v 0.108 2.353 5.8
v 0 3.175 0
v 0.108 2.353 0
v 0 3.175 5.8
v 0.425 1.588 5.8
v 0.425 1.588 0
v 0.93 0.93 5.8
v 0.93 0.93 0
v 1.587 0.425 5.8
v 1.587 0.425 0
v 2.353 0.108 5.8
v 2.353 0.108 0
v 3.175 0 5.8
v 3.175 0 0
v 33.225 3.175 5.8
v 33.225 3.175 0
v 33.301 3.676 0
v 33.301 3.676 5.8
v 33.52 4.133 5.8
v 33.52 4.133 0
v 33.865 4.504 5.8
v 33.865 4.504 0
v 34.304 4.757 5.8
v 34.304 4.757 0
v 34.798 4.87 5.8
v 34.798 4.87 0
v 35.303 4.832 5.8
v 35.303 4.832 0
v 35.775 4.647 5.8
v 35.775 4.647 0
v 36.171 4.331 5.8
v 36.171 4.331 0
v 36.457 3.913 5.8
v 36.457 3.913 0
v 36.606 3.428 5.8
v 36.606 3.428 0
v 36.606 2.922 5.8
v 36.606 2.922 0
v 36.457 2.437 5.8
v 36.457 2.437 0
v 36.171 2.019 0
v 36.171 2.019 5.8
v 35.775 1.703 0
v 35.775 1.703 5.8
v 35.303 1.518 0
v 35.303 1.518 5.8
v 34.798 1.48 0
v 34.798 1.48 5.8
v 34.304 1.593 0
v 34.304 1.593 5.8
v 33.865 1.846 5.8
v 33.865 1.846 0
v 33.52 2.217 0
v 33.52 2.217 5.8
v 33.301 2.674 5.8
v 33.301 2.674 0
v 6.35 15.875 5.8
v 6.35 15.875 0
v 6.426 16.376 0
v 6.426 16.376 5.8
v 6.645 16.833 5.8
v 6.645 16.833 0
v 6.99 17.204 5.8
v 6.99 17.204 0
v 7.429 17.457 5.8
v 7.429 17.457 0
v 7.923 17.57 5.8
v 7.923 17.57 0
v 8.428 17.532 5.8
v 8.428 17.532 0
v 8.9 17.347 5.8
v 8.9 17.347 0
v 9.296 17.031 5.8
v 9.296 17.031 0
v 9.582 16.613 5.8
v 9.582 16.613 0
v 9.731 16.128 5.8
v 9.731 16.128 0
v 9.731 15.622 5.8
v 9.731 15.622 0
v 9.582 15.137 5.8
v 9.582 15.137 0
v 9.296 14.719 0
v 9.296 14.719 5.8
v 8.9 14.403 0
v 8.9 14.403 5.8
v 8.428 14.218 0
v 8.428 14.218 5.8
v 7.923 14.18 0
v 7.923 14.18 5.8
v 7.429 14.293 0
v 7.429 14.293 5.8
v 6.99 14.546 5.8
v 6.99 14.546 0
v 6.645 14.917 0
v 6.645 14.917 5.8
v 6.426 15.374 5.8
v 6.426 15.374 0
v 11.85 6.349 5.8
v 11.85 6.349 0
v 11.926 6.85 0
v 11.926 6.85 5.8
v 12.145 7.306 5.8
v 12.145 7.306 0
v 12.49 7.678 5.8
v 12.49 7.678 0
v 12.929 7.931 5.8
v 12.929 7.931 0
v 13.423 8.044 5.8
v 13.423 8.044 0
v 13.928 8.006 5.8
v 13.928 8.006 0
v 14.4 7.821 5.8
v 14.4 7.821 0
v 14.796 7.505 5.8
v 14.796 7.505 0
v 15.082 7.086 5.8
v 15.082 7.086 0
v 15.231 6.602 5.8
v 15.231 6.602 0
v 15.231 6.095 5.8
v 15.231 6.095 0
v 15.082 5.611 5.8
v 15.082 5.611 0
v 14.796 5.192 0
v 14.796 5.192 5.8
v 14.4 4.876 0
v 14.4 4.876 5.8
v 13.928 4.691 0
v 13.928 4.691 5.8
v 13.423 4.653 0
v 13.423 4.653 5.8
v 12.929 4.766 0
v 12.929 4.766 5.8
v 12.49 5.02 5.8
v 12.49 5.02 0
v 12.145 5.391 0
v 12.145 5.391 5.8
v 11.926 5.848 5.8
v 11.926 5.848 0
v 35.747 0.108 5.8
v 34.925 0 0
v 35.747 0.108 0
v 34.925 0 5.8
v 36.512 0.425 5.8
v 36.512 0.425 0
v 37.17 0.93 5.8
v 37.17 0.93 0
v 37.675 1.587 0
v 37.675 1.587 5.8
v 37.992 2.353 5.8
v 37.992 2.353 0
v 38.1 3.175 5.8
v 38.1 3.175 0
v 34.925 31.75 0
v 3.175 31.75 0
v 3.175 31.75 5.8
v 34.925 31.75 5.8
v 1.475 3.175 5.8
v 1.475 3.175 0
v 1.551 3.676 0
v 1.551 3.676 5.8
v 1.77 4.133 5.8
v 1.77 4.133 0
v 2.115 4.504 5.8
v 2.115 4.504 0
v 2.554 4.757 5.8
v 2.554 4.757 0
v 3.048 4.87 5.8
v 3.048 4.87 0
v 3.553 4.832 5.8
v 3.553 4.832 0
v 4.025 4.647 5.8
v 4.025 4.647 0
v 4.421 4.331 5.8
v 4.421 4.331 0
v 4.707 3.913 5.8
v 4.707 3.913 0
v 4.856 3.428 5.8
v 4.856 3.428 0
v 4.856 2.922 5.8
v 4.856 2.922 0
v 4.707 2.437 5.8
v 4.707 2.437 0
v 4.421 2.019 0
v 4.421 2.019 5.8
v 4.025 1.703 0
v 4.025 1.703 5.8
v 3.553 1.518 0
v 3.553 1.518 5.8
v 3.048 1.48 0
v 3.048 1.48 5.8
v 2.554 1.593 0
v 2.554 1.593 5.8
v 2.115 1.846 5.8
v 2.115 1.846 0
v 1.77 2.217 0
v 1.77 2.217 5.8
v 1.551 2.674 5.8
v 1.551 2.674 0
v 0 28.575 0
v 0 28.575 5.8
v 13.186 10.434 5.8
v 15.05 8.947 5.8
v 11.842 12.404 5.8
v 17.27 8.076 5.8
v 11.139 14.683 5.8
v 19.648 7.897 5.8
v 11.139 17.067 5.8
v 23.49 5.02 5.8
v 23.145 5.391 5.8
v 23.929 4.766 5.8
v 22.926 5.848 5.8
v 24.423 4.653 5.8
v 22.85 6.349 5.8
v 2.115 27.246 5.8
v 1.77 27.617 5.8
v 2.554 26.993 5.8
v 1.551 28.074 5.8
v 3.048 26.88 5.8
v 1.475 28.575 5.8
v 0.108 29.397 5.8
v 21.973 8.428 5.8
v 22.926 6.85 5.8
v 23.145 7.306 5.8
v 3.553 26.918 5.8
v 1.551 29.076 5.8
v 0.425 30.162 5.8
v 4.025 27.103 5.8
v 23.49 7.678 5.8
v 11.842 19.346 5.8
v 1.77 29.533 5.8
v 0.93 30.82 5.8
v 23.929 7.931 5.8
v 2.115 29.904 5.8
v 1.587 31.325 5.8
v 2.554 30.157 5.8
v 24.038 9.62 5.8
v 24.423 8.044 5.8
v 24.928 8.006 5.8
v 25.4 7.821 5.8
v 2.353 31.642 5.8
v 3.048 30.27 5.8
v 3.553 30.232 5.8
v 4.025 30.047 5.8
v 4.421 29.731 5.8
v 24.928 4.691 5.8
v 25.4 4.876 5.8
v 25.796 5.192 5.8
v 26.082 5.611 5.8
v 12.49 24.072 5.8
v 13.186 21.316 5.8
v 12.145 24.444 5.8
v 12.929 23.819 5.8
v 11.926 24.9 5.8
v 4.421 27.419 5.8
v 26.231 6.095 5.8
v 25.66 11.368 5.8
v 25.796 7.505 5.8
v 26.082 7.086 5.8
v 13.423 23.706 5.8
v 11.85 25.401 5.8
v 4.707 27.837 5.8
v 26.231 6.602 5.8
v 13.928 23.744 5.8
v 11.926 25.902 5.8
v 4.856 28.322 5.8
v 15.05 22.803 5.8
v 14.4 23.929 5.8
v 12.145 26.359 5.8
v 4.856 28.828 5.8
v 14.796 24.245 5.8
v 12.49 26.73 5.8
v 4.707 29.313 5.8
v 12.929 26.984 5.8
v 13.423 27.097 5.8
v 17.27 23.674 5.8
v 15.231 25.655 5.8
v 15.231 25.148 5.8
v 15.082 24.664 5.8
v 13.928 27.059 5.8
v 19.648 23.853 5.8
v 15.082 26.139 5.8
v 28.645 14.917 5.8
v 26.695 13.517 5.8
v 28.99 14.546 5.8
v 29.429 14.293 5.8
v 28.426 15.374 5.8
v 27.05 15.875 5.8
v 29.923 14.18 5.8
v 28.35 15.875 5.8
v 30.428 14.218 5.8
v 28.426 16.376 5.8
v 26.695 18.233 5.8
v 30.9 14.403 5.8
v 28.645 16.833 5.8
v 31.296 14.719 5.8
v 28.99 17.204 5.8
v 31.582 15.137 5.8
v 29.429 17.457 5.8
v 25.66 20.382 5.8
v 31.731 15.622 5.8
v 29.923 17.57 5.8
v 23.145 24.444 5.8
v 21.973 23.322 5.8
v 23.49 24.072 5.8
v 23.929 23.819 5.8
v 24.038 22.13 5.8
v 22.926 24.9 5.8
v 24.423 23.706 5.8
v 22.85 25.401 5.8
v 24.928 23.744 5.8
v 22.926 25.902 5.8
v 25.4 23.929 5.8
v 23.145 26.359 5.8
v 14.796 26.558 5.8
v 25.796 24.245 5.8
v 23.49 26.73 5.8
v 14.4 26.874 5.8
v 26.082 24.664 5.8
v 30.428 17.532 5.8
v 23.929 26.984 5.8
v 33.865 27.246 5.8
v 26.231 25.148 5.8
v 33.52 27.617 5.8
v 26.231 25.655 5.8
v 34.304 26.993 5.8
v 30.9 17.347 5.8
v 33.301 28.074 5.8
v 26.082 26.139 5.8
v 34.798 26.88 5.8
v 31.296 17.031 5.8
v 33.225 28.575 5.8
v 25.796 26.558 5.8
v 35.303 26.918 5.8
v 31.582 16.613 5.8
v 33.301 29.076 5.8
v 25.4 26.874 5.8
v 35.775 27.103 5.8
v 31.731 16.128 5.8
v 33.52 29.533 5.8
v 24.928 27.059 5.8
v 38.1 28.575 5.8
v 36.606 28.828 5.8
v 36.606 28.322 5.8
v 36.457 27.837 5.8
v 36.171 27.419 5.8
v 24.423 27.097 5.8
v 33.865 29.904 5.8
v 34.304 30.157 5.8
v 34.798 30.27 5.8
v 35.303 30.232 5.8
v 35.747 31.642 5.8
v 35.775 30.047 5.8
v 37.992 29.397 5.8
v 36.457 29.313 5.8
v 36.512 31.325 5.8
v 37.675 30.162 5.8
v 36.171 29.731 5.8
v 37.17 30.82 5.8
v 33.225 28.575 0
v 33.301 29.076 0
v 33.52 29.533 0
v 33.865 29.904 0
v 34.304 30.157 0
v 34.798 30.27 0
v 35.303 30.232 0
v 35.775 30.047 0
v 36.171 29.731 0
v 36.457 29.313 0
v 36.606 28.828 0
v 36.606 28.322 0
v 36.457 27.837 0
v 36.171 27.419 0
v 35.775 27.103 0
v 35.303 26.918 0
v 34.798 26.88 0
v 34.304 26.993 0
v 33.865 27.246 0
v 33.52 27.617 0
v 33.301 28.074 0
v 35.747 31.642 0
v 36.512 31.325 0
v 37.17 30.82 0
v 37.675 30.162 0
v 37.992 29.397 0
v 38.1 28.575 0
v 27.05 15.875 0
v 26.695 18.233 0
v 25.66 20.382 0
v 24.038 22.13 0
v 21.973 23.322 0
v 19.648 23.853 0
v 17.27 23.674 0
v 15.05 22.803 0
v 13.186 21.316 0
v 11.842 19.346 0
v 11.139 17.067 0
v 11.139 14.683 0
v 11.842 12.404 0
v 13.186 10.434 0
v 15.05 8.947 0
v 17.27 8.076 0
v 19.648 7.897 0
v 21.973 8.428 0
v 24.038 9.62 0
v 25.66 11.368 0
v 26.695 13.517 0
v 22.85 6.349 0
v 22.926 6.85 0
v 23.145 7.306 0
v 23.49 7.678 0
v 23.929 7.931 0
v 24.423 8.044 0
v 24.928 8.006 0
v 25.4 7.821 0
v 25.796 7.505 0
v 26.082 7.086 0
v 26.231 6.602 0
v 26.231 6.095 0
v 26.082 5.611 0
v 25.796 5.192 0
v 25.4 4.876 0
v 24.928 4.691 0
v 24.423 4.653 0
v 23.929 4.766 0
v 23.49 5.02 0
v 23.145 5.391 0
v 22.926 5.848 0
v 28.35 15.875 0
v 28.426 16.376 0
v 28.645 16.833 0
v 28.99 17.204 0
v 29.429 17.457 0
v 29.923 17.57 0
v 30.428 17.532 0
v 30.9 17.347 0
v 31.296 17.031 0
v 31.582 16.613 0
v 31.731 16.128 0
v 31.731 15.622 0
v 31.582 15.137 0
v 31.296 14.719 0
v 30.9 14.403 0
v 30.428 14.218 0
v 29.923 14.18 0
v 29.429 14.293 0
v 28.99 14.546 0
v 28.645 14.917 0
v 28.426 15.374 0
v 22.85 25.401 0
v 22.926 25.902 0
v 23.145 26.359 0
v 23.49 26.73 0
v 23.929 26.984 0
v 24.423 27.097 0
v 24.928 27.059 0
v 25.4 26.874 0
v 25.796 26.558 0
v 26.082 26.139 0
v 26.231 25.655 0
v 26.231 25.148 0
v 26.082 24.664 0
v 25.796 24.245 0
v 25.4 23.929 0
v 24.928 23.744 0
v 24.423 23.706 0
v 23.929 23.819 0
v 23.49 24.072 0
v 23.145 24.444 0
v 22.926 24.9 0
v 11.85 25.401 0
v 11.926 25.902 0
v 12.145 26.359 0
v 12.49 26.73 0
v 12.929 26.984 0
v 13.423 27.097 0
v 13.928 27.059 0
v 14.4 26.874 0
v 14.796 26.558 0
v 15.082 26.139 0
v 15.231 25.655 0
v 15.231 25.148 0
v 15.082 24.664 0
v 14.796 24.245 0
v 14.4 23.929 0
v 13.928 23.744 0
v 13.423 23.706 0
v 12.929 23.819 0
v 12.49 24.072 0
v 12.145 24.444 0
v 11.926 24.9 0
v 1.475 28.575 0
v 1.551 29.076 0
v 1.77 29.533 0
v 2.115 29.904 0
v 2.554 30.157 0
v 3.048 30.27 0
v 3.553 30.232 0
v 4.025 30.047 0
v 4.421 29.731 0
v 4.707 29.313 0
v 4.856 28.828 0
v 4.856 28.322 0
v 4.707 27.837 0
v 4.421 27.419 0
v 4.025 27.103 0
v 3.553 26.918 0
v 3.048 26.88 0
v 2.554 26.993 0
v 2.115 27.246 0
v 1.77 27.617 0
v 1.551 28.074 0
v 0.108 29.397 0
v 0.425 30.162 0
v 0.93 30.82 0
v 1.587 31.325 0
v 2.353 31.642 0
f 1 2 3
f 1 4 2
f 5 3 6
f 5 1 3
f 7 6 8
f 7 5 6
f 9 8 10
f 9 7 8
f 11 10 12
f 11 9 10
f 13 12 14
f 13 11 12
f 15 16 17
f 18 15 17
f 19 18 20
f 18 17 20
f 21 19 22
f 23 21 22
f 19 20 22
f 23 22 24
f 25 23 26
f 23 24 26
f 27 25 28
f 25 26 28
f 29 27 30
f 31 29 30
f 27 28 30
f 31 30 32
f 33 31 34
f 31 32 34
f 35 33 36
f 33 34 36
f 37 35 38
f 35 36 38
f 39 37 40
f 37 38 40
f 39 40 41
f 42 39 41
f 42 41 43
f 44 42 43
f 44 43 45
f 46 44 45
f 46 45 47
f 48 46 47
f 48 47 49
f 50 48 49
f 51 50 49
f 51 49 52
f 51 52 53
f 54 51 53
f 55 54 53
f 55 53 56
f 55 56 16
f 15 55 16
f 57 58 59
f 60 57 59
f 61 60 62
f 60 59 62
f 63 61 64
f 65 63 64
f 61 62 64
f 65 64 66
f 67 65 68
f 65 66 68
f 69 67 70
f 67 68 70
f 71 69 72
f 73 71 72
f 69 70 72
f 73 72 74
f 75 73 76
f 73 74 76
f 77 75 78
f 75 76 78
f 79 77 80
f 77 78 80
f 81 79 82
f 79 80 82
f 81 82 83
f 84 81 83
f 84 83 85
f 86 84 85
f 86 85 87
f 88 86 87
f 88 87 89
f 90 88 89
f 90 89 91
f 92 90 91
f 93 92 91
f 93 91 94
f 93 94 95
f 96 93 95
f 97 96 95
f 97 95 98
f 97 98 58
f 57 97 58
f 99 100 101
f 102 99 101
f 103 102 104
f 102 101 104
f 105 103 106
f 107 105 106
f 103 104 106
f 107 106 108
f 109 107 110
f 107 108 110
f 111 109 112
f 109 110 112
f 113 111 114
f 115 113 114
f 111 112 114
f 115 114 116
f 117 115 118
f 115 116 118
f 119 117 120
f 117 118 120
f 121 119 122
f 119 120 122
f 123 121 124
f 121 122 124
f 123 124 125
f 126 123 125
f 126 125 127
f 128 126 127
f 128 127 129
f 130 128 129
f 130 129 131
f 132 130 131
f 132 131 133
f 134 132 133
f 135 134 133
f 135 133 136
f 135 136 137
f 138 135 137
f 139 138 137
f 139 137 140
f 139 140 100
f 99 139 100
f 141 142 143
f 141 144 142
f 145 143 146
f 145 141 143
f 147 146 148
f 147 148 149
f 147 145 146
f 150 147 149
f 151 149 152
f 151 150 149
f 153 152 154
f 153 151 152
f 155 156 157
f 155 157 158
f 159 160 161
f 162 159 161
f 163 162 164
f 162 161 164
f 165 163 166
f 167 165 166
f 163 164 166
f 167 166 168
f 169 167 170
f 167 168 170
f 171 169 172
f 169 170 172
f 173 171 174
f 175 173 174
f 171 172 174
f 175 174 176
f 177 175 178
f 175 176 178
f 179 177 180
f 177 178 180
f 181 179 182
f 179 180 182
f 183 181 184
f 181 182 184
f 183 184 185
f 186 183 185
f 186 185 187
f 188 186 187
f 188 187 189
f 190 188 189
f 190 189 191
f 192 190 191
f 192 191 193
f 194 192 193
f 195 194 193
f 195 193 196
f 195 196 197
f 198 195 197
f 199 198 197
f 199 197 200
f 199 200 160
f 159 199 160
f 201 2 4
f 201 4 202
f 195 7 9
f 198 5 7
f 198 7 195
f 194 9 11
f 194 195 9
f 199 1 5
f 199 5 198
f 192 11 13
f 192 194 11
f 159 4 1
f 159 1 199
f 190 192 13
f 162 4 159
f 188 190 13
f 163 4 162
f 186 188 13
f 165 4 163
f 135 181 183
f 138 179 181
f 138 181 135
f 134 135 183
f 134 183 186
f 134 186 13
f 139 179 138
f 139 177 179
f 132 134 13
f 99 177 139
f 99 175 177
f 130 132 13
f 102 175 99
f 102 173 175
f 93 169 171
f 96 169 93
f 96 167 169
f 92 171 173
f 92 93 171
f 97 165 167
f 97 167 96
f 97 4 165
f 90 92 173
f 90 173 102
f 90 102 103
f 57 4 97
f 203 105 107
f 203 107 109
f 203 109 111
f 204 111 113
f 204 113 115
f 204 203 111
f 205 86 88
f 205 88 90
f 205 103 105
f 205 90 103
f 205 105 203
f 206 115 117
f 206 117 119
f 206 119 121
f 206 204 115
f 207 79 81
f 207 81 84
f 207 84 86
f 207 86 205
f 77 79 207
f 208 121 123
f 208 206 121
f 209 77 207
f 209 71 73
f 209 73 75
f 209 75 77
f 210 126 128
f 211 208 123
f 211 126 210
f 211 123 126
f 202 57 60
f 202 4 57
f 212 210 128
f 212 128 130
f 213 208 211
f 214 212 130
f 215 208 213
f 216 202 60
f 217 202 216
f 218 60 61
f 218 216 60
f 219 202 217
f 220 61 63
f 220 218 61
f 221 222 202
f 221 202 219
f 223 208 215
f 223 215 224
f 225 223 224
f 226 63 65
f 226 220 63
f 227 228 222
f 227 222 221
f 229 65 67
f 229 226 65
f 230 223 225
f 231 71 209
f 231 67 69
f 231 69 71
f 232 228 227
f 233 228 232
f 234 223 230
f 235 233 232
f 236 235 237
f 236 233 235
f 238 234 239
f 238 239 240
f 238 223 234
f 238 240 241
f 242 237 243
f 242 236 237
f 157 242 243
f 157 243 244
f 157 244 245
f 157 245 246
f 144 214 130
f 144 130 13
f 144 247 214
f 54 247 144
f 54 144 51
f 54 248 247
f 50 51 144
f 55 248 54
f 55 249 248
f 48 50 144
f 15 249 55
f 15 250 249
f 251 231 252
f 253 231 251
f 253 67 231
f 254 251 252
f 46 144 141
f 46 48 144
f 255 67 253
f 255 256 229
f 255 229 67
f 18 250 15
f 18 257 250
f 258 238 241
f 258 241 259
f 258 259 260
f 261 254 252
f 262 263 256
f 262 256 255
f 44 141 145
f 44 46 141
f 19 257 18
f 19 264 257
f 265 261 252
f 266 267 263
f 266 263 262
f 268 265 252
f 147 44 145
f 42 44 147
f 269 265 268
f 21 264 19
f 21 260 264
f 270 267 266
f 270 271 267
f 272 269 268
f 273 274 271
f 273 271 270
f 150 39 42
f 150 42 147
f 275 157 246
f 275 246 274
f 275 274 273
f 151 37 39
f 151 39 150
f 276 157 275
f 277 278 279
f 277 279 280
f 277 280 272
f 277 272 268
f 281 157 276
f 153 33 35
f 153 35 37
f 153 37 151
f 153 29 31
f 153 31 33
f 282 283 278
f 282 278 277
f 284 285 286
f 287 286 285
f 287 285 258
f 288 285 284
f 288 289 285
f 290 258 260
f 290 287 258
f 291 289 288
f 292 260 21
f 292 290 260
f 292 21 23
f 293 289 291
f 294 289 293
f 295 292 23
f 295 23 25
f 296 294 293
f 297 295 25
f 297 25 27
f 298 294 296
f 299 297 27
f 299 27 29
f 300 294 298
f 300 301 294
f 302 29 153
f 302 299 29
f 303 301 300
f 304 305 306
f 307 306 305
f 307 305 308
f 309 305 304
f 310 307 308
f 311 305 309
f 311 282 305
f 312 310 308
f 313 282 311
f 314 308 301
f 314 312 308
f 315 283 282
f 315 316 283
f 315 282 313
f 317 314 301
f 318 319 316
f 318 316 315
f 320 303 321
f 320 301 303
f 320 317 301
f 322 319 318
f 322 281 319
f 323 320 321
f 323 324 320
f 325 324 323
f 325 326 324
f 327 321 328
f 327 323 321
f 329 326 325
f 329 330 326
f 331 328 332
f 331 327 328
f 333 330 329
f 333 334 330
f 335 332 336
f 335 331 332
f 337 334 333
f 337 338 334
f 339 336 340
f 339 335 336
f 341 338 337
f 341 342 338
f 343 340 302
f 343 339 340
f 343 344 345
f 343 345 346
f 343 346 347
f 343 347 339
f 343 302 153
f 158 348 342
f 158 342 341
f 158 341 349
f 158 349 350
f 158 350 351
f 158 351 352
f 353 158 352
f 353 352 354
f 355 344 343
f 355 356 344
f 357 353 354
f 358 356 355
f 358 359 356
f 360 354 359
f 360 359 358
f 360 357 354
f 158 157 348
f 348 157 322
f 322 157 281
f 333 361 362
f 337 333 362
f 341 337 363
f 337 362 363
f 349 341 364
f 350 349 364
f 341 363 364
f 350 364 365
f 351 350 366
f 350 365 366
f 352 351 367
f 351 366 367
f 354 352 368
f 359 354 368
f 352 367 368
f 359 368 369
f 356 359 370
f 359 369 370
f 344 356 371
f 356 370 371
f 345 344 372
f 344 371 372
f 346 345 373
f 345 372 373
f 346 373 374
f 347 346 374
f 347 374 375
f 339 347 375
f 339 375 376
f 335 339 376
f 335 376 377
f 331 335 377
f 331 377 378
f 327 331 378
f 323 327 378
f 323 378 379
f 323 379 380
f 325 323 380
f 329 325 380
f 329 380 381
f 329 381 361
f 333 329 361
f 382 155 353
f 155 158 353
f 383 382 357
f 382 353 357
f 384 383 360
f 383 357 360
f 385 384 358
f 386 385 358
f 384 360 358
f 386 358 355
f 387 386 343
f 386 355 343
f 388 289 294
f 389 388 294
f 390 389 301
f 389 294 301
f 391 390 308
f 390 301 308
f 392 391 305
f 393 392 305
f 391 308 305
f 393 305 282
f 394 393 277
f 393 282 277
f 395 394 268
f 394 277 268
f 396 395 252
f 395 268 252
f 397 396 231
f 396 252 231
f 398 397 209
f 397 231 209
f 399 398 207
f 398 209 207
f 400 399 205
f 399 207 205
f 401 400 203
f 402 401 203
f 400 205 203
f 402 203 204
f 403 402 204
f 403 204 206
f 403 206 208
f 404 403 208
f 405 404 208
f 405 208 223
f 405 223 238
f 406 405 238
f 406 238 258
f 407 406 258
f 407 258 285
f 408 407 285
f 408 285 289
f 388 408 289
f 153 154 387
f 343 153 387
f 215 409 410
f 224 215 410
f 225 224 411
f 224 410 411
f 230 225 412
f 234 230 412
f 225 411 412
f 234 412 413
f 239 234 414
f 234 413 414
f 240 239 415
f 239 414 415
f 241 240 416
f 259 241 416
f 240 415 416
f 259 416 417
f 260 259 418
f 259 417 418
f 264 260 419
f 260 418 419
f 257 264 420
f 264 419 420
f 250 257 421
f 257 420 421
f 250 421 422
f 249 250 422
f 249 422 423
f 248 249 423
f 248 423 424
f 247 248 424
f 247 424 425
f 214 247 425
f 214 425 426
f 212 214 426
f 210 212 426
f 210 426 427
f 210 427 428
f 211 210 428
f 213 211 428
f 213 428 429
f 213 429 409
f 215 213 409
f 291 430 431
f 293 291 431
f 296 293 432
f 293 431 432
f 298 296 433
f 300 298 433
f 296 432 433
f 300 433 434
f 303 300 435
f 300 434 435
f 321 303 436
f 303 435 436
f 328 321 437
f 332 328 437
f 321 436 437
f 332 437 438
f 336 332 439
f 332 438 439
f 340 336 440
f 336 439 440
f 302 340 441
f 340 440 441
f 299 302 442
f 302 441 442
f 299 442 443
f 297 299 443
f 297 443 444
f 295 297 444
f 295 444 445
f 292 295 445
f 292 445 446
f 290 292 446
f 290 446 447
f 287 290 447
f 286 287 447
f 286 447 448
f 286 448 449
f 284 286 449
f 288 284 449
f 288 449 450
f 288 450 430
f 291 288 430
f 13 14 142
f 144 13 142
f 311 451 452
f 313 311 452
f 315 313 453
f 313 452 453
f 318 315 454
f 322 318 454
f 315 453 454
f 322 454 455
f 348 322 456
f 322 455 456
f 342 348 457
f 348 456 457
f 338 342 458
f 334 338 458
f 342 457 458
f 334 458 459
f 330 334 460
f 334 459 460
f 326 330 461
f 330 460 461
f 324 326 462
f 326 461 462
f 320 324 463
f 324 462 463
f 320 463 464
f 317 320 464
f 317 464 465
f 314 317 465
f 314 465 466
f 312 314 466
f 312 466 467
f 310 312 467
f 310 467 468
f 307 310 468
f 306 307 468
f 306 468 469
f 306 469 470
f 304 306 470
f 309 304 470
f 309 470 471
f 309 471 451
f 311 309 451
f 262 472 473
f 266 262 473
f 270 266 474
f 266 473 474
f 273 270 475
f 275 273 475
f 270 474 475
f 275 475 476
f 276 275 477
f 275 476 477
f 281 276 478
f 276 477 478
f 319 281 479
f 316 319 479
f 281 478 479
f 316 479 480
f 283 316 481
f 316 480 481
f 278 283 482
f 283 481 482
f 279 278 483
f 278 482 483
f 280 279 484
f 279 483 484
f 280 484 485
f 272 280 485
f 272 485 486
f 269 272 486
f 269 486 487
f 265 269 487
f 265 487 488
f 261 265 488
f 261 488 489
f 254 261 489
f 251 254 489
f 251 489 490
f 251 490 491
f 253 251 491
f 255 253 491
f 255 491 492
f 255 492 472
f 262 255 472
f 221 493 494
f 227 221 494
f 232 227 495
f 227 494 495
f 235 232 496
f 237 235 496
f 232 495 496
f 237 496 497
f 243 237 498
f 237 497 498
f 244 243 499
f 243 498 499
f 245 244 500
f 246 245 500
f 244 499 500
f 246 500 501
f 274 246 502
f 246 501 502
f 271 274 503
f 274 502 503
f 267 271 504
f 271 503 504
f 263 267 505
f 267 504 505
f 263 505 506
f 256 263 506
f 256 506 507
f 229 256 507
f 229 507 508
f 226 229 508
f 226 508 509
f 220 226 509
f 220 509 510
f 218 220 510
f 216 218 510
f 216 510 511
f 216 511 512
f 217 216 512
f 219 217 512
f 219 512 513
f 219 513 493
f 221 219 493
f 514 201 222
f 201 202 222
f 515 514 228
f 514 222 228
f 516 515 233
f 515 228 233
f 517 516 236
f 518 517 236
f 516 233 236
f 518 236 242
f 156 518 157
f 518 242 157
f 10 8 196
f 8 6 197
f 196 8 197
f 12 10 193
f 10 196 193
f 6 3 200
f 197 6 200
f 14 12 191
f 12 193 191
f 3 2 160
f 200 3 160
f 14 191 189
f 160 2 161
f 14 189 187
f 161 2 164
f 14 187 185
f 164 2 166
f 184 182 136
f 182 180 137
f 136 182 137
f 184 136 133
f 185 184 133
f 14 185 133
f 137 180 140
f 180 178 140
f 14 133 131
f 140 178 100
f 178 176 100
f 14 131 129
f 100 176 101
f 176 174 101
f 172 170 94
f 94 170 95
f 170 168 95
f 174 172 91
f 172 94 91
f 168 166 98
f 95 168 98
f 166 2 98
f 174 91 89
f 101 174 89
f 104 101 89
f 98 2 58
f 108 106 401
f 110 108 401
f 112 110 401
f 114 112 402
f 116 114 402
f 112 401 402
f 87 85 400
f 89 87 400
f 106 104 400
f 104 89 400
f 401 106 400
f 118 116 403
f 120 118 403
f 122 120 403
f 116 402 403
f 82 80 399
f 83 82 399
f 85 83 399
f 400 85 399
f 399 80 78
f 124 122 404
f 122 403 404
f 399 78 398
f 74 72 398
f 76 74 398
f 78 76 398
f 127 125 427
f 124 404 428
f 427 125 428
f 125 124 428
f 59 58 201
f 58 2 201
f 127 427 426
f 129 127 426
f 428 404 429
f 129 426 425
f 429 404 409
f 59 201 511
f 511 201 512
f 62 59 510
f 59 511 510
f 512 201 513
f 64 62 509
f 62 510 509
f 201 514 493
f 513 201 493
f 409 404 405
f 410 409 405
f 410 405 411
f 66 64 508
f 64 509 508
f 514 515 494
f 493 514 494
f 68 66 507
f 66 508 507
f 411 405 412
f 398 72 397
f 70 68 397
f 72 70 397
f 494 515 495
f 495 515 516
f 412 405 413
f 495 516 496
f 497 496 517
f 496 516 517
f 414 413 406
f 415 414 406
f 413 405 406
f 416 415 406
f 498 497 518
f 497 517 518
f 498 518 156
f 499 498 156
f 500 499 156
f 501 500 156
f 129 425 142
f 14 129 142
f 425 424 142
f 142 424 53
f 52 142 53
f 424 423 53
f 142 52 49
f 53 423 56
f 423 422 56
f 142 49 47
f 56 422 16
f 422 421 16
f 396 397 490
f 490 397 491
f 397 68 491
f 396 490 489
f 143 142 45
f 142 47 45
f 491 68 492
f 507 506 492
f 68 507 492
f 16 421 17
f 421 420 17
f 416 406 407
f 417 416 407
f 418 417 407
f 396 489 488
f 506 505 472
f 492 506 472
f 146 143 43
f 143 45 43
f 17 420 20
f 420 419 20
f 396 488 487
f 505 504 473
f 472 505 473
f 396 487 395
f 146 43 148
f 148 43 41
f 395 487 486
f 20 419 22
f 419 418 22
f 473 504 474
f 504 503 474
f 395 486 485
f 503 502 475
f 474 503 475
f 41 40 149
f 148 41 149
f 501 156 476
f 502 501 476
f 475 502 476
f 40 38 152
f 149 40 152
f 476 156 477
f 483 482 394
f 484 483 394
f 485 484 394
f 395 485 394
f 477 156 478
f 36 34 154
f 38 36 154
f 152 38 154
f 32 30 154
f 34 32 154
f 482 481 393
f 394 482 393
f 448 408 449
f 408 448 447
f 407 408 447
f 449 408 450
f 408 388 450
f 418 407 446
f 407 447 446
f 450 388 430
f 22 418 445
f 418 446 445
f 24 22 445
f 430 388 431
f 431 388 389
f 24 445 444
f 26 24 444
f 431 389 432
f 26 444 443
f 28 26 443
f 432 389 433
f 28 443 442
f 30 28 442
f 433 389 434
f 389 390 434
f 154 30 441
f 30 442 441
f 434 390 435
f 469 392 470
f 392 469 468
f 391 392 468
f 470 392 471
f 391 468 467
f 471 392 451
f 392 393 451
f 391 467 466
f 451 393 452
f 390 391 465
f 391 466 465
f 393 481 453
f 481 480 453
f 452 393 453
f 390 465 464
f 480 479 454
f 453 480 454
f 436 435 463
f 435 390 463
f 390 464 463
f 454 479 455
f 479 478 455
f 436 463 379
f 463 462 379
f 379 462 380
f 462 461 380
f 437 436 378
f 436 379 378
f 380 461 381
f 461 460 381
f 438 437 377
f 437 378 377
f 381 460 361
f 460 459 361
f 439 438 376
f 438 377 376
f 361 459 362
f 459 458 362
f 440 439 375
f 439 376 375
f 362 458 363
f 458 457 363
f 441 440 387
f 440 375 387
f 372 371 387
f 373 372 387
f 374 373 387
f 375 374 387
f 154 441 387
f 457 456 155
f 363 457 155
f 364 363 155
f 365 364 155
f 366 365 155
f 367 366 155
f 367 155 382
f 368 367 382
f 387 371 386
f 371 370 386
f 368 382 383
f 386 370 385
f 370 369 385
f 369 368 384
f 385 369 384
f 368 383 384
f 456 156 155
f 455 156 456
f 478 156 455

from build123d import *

# Parameters (mm, degrees)
SKETCH1_W                = 38.1
SKETCH1_H                = 31.75
BOSS_EXTRUDE1_DEPTH      = 5.8
SKETCH2_R                = 8
CUT_EXTRUDE1_DEPTH       = 50.933080217
M3_CLEARANCE_HOLE1_D     = 3.4
M3_CLEARANCE_HOLE1_DEPTH = 6.35
M3_CLEARANCE_HOLE1_TIP   = 1.021463052
M3_CLEARANCE_HOLE2_D     = 3.4
M3_CLEARANCE_HOLE2_DEPTH = 6.35
M3_CLEARANCE_HOLE2_TIP   = 1.021463052
FILLET1_R                = 3.175


with BuildPart() as part:
    # Sketch1 → Boss-Extrude1 (new body)
    with BuildSketch(Plane.XY):
        with Locations((19.05, 15.875)):
            Rectangle(SKETCH1_W, SKETCH1_H)
    extrude(amount=BOSS_EXTRUDE1_DEPTH)

    # Sketch2 → Cut-Extrude1 (cut, through all)
    with BuildSketch(Plane.XY.offset(5.8)):
        with Locations((19.05, 15.875)):
            Circle(SKETCH2_R)
    extrude(amount=-CUT_EXTRUDE1_DEPTH, mode=Mode.SUBTRACT)

    # M3 Clearance Hole1
    with Locations(Plane.XY.offset(5.8)):
        with Locations((30.05, 15.875), (24.55, 25.401279442), (13.55, 25.401279442), (8.05, 15.875), (13.55, 6.348720558), (24.55, 6.348720558)):
            Hole(M3_CLEARANCE_HOLE1_D / 2, depth=M3_CLEARANCE_HOLE1_DEPTH)
            with Locations((0, 0, -(M3_CLEARANCE_HOLE1_DEPTH + M3_CLEARANCE_HOLE1_TIP / 2))):  # 118° drill point
                Cone(0, M3_CLEARANCE_HOLE1_D / 2, M3_CLEARANCE_HOLE1_TIP, mode=Mode.SUBTRACT)

    # M3 Clearance Hole2
    with Locations(Plane.XY.offset(5.8)):
        with Locations((3.175, 28.575), (34.925, 28.575), (34.925, 3.175), (3.175, 3.175)):
            Hole(M3_CLEARANCE_HOLE2_D / 2, depth=M3_CLEARANCE_HOLE2_DEPTH)
            with Locations((0, 0, -(M3_CLEARANCE_HOLE2_DEPTH + M3_CLEARANCE_HOLE2_TIP / 2))):  # 118° drill point
                Cone(0, M3_CLEARANCE_HOLE2_D / 2, M3_CLEARANCE_HOLE2_TIP, mode=Mode.SUBTRACT)

    # Fillet1
    fillet1_edges = [part.edges().sort_by_distance(p)[0] for p in [
        (0, 31.75, 2.9),
        (38.1, 31.75, 2.9),
        (38.1, 0, 2.9),
        (0, 0, 2.9),
    ]]
    fillet(fillet1_edges, radius=FILLET1_R)


solid = part.part
